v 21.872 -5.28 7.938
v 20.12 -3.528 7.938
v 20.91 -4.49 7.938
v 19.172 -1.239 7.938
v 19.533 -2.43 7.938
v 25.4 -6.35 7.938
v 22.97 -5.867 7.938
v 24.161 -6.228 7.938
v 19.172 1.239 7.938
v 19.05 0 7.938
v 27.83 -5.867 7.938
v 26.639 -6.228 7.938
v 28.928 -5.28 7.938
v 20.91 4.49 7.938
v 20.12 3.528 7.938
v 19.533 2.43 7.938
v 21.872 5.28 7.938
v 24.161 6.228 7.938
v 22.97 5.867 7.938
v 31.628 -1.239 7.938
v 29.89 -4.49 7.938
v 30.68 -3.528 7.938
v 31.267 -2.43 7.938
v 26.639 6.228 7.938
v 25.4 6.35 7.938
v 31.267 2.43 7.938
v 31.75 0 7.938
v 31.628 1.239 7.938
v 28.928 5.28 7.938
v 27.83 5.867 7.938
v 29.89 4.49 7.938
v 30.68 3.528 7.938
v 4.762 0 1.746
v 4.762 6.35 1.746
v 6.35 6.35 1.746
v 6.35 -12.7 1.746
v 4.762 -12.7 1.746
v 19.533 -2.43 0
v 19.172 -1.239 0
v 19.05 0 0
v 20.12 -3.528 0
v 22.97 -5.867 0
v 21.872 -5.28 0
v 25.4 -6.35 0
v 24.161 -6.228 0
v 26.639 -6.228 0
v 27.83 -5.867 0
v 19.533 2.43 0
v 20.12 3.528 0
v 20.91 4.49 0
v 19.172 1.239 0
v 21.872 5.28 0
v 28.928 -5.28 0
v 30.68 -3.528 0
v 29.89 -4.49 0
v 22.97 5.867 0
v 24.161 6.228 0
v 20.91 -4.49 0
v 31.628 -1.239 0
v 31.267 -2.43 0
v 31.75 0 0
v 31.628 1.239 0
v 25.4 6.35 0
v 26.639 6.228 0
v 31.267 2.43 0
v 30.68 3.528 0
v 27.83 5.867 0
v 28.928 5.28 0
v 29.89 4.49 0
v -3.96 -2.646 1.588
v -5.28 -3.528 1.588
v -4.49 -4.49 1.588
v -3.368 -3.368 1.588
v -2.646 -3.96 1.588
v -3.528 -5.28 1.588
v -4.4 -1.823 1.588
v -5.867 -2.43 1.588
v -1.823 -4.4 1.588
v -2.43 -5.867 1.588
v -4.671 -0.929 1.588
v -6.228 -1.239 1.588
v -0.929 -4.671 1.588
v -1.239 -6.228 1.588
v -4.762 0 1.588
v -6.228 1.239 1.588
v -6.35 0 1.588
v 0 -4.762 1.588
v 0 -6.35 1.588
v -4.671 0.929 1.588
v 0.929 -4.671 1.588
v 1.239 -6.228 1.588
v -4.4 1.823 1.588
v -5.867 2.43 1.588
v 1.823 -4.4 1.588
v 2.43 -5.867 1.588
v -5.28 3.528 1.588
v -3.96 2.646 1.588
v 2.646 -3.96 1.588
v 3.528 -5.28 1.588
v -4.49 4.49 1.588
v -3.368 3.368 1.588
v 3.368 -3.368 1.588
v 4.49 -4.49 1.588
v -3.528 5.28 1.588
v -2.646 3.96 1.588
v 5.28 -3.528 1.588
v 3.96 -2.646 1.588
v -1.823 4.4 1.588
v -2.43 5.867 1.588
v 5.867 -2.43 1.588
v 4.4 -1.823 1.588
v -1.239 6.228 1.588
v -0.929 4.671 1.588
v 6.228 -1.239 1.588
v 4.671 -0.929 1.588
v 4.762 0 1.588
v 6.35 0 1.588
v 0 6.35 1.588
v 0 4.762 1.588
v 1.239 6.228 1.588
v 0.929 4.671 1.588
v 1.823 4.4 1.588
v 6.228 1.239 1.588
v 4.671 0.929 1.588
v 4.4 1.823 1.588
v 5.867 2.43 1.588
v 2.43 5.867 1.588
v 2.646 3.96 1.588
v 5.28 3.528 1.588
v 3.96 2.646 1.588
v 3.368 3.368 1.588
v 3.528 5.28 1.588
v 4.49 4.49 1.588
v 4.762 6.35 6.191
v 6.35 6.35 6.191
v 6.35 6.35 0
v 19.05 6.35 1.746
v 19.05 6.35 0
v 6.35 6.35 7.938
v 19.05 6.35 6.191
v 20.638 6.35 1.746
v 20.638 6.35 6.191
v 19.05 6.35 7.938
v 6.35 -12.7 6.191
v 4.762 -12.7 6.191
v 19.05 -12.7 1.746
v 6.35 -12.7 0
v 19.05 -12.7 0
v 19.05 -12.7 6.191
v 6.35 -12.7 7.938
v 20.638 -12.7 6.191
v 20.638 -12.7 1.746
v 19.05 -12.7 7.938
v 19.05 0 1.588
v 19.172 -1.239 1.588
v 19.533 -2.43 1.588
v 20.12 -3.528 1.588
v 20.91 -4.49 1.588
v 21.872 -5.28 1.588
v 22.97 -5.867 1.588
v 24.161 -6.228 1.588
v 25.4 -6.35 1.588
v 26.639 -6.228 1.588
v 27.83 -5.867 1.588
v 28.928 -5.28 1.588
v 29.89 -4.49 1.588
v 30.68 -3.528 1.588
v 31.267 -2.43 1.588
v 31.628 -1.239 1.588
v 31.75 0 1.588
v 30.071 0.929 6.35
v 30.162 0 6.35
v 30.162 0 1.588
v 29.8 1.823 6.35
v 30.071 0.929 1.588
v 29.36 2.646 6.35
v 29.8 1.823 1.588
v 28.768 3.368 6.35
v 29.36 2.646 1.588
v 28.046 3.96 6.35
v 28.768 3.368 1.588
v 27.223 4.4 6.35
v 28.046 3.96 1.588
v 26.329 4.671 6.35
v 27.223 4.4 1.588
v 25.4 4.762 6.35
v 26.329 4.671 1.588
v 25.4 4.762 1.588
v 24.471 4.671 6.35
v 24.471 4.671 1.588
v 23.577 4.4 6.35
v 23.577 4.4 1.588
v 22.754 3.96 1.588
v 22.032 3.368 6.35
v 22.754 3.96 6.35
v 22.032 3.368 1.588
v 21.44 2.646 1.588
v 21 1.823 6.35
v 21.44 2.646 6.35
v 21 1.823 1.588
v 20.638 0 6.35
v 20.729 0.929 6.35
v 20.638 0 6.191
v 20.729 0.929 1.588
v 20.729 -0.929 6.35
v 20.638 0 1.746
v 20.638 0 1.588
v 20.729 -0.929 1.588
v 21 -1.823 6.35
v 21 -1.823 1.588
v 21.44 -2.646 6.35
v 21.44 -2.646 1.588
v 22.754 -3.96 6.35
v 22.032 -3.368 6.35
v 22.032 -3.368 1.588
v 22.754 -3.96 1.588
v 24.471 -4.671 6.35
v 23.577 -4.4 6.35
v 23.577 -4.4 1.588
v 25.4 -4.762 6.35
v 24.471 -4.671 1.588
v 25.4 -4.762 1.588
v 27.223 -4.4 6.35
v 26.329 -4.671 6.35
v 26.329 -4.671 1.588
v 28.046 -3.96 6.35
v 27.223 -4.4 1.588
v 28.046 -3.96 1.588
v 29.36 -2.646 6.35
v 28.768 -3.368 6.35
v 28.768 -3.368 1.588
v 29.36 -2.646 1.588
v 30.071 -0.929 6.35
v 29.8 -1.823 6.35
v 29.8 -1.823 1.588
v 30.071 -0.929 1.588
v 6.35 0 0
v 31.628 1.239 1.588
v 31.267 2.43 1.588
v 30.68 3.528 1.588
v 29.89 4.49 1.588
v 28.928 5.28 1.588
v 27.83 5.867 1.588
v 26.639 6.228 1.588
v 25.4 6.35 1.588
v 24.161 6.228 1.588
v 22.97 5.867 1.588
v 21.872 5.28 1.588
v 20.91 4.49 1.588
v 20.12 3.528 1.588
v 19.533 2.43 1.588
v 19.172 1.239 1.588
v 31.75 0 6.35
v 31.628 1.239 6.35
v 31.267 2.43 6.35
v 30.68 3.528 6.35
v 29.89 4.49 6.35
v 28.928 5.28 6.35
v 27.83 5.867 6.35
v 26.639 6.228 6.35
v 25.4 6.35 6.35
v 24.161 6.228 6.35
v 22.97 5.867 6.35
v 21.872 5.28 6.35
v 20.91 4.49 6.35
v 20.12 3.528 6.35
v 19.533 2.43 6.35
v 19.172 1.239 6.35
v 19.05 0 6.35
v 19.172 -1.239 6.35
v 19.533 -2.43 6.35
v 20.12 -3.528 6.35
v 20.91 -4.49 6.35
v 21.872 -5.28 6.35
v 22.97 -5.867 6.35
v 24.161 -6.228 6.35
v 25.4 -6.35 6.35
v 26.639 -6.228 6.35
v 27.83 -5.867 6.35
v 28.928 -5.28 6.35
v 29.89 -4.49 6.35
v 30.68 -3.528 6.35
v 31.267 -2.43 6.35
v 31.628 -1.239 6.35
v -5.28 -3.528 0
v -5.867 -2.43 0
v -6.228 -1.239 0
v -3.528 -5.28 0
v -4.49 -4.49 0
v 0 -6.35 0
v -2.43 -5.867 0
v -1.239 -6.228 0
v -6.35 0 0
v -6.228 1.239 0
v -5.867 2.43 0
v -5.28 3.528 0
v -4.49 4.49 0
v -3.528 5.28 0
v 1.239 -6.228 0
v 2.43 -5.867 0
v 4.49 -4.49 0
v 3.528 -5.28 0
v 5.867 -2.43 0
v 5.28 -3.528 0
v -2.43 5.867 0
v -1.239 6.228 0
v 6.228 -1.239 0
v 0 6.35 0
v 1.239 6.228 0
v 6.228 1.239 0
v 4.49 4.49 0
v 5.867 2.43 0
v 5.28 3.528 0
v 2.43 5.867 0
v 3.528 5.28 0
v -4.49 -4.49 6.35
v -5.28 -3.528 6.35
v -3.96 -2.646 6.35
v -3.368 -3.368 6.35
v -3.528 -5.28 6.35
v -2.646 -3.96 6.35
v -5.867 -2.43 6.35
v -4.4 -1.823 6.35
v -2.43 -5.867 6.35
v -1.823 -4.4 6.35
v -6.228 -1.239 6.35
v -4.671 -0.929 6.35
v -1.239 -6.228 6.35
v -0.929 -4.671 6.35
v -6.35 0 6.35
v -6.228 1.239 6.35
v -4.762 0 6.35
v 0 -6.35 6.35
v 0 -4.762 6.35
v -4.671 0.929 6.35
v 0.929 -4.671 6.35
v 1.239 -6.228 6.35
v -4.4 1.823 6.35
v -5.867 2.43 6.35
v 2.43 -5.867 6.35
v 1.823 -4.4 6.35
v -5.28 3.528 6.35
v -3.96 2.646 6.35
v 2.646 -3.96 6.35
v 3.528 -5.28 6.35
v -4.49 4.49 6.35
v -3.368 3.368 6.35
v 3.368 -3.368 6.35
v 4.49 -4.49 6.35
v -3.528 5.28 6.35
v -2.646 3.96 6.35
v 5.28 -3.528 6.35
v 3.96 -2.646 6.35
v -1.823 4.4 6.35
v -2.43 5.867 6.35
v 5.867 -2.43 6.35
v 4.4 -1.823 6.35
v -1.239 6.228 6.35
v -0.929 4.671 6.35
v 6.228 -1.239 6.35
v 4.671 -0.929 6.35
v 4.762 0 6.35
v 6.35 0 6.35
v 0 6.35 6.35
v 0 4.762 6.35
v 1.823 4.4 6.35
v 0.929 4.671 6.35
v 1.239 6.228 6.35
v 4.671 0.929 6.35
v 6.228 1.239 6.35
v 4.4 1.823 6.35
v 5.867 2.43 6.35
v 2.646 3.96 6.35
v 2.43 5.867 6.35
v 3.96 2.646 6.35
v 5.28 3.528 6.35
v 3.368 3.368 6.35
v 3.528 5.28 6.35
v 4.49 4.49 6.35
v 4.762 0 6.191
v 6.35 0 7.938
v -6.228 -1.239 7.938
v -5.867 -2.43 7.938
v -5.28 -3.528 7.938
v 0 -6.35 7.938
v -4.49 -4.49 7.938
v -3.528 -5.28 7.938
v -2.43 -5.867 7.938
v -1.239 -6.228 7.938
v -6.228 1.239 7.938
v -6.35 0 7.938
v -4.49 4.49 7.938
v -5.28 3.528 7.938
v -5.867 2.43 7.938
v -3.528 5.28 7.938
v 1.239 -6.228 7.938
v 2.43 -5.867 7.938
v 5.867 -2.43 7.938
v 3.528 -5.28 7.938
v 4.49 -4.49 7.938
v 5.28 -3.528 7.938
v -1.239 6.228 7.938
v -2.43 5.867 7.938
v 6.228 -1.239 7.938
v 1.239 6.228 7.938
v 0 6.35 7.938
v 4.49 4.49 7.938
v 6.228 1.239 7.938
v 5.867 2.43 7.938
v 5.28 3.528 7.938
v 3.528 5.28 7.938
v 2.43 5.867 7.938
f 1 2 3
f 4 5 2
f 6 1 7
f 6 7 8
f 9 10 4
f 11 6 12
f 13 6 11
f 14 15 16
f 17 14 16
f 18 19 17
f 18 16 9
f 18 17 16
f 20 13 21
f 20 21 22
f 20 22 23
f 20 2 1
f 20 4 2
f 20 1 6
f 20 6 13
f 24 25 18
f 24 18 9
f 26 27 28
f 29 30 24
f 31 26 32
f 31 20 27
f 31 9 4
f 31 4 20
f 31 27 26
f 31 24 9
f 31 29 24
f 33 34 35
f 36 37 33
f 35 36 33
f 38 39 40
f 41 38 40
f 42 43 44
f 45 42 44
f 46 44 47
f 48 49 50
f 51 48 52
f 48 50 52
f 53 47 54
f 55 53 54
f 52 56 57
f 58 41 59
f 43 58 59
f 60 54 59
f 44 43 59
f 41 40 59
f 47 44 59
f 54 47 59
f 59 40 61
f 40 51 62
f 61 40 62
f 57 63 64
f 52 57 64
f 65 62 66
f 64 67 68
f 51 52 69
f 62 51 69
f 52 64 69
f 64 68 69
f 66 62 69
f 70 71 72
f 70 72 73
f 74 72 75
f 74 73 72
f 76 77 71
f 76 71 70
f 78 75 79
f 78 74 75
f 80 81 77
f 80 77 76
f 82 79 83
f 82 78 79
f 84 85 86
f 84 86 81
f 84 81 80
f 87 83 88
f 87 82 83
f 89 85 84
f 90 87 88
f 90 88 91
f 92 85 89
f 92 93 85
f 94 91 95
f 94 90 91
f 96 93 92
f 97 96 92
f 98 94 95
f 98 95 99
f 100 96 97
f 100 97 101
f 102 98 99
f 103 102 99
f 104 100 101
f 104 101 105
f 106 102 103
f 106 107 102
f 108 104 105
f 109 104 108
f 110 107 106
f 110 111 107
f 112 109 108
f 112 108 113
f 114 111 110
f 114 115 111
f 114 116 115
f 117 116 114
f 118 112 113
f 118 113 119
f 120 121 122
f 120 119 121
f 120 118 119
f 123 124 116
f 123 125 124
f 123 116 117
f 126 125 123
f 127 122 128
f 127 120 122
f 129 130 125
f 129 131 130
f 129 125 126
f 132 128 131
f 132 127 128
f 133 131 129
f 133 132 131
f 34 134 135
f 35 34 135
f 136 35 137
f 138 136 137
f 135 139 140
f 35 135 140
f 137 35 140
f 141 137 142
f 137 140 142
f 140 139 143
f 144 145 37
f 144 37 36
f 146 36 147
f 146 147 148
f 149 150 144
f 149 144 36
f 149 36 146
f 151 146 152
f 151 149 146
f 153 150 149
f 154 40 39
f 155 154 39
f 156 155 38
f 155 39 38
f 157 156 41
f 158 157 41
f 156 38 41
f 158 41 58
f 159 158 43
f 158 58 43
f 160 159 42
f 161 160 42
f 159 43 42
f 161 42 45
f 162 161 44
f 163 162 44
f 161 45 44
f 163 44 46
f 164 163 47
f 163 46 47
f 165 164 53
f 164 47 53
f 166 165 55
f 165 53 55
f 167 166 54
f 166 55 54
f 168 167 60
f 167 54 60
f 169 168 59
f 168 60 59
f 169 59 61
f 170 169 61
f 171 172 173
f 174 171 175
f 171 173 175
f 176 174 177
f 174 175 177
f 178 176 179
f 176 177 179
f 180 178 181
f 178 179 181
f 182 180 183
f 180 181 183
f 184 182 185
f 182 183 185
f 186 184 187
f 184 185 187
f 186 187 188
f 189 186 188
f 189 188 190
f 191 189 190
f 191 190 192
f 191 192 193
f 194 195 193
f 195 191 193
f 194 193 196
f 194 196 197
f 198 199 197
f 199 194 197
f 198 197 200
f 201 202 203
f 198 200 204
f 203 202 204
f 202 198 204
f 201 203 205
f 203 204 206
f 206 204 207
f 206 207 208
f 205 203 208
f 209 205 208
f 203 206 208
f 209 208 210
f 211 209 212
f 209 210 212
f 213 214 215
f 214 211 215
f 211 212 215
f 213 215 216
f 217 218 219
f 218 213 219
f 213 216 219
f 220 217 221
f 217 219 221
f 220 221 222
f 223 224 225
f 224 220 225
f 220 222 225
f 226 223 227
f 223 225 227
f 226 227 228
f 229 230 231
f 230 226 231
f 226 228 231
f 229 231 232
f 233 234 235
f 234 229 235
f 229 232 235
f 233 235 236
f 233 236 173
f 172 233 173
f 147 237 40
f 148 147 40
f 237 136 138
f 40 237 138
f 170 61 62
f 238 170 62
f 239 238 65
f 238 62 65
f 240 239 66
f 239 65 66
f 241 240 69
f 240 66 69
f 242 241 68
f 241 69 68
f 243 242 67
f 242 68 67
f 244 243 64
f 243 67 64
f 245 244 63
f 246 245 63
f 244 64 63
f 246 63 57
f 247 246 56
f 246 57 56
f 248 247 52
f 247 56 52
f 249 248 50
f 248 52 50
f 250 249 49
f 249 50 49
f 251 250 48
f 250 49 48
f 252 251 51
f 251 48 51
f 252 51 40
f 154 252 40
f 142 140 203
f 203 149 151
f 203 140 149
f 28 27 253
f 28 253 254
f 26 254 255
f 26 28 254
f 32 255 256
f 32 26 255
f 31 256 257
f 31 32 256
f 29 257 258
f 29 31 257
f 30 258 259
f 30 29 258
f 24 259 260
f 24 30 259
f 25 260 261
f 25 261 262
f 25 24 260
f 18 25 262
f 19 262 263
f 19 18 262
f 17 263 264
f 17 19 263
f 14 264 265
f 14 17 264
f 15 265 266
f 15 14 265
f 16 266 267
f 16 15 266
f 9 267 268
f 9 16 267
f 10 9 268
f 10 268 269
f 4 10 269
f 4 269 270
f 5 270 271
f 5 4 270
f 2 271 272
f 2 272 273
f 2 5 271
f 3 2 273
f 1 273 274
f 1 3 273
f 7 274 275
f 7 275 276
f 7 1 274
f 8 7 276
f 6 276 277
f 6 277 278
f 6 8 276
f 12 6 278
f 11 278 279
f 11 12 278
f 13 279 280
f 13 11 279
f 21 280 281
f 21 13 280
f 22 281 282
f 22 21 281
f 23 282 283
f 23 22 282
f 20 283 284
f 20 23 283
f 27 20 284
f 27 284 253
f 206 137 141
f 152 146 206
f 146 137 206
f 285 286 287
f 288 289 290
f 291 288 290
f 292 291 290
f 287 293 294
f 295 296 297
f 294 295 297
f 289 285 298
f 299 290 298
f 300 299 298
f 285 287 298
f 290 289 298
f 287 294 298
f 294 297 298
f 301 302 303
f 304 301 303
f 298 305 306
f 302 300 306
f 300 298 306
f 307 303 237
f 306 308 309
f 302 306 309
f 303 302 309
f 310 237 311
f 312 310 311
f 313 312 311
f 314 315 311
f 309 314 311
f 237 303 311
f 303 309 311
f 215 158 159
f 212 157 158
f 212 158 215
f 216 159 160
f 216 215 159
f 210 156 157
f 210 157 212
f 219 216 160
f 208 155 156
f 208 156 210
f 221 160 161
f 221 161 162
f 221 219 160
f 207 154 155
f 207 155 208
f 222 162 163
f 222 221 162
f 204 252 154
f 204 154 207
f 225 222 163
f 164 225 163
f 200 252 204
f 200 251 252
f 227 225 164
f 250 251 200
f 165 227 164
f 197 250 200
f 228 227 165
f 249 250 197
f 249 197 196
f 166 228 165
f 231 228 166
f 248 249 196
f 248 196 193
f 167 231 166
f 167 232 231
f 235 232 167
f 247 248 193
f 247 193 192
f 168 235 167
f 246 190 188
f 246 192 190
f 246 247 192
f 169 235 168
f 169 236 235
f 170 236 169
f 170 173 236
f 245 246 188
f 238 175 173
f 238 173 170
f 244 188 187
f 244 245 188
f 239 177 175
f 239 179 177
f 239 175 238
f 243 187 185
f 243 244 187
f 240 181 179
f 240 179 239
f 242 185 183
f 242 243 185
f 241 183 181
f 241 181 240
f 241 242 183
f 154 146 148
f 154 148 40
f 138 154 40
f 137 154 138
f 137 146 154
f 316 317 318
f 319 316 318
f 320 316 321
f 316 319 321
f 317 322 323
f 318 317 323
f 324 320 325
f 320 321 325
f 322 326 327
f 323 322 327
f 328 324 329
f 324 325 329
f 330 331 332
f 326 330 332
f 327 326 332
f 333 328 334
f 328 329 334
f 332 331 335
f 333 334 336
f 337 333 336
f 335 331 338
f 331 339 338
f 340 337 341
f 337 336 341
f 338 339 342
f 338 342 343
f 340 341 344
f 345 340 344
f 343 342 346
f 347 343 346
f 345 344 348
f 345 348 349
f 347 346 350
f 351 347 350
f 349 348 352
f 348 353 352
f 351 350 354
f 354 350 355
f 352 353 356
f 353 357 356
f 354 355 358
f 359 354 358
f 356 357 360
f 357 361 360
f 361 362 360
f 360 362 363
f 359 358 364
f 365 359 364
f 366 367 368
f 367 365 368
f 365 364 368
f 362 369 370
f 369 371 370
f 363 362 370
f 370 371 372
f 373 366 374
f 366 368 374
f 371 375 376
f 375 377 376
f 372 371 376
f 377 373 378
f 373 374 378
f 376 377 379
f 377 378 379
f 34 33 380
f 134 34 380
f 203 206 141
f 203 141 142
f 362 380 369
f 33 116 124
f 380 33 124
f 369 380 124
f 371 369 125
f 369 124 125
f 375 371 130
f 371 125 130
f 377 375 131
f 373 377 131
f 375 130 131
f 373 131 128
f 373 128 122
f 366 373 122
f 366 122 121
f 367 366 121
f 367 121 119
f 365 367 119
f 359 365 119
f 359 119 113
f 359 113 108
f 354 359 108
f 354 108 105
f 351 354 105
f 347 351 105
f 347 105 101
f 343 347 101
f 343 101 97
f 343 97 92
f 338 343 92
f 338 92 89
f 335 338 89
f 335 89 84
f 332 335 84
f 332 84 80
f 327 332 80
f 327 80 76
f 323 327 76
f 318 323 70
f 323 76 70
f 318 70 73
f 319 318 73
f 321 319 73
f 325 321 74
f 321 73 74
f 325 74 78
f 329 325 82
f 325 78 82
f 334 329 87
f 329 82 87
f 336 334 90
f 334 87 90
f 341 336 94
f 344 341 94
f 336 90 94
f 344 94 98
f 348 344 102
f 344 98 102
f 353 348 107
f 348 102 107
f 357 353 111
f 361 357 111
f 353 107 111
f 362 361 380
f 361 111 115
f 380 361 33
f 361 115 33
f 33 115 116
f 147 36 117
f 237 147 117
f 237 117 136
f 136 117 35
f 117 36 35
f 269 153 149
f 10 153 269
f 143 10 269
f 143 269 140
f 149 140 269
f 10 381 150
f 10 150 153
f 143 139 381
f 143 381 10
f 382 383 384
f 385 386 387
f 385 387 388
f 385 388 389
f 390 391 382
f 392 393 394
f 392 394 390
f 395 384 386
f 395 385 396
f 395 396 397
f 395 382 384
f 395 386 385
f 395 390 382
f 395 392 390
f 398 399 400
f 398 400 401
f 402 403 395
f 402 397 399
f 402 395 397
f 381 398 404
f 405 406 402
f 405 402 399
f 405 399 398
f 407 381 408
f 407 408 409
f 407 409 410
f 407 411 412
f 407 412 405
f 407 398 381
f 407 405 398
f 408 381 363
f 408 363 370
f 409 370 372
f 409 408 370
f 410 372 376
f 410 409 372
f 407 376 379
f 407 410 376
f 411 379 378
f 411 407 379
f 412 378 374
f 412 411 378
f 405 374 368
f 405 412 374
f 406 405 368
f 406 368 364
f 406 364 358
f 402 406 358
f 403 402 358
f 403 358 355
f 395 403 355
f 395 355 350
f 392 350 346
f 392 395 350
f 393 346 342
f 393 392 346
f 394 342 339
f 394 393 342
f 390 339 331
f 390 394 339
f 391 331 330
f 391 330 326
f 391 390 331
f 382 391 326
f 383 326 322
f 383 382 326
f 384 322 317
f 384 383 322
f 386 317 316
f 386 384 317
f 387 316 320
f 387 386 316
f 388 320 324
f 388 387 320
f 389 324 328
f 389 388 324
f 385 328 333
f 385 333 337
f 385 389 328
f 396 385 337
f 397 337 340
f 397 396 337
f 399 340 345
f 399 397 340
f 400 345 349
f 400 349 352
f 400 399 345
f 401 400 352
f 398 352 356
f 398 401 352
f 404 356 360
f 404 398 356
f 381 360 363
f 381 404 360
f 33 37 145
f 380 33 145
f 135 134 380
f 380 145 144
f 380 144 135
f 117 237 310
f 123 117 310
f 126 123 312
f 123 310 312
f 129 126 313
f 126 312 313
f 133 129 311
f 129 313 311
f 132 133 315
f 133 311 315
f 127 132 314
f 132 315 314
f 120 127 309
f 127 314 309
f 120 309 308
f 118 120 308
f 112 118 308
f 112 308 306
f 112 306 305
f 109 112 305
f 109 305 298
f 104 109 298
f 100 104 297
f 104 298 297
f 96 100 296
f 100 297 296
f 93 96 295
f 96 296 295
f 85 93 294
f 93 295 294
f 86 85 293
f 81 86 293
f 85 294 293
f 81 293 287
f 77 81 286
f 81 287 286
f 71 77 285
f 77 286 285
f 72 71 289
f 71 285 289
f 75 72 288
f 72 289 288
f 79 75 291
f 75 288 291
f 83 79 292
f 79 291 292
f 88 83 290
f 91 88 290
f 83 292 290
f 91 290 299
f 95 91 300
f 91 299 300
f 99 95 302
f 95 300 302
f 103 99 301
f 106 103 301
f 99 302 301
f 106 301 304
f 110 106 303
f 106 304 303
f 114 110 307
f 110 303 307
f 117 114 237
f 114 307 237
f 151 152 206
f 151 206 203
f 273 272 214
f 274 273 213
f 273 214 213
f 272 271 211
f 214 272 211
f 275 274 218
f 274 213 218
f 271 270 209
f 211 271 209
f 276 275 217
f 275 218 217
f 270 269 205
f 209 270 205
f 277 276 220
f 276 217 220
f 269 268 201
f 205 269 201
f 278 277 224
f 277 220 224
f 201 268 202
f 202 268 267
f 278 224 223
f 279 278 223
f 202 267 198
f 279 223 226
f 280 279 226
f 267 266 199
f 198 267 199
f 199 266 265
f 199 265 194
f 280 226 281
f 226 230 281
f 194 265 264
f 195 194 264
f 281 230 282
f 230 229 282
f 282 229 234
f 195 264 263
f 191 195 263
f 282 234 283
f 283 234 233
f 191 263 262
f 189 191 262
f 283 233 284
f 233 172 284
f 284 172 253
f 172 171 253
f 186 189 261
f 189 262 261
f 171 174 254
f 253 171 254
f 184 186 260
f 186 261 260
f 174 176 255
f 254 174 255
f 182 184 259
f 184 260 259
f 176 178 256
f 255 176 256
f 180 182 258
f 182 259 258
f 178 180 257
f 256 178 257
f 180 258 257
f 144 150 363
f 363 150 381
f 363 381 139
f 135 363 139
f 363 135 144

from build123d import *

# Parameters (mm, degrees)
F0_R     = 6.35
F1_DEPTH = 1.5875
F2_R     = 4.7625
F3_DEPTH = 6.35
F4_R     = 6.35
F4_R_2   = 4.7625
F5_DEPTH = 1.5875
F6_W     = 12.7
F6_H     = 19.05
F7_DEPTH = 7.9375
F8_W     = 15.875
F8_H     = 4.445
F9_DEPTH = 19.05


# Not quite as in the source:
# - a feature names something its author has since deleted; it is built from what else it names


with BuildPart() as f1:
    # F0 (on Top) → F1 (new body)
    with BuildSketch(Plane.XY):
        with Locations((25.4, 0)):
            Circle(F0_R)
    extrude(amount=F1_DEPTH)

    # F2 (on face) → F3, piece 2 (join)
    with BuildSketch(Plane.XY.offset(1.5875)):
        with Locations((25.4, 0)):
            Circle(F2_R)
    extrude(amount=F3_DEPTH)

    # F4 (on face) → F5, piece 2 (join)
    with BuildSketch(Plane.XY.offset(7.9375)):
        with Locations((25.4, 0)):
            Circle(F4_R)
    extrude(amount=-F5_DEPTH)



with BuildPart() as f1b:
    # F0 (on Top) → F1, piece 2 (new body)
    with BuildSketch(Plane.XY):
        Circle(F0_R)
    extrude(amount=F1_DEPTH)

    # F2 (on face) → F3 (join)
    with BuildSketch(Plane.XY.offset(1.5875)):
        Circle(F2_R)
    extrude(amount=F3_DEPTH)

    # F4 (on face) → F5 (join)
    with BuildSketch(Plane.XY.offset(7.9375)):
        Circle(F4_R)
        Circle(F4_R_2, mode=Mode.SUBTRACT)
    extrude(amount=-F5_DEPTH)


with BuildPart() as f7:
    # F6 (on face) → F7 (new body, through all)
    with BuildSketch(Plane.XY.offset(7.9375)):
        with Locations((12.7, -3.175)):
            Rectangle(F6_W, F6_H)
    extrude(amount=-F7_DEPTH)


with BuildPart() as f1_1:
    add(f1.part)

    add(f1b.part)  # F9 merges F1b

    add(f7.part)  # F9 merges F7
    # F8 (on face) → F9 (join, through all)
    with BuildSketch(Plane.XZ.offset(12.7)):
        with Locations((12.7, 3.96875)):
            Rectangle(F8_W, F8_H)
    extrude(amount=-F9_DEPTH)


solid = f1_1.part
